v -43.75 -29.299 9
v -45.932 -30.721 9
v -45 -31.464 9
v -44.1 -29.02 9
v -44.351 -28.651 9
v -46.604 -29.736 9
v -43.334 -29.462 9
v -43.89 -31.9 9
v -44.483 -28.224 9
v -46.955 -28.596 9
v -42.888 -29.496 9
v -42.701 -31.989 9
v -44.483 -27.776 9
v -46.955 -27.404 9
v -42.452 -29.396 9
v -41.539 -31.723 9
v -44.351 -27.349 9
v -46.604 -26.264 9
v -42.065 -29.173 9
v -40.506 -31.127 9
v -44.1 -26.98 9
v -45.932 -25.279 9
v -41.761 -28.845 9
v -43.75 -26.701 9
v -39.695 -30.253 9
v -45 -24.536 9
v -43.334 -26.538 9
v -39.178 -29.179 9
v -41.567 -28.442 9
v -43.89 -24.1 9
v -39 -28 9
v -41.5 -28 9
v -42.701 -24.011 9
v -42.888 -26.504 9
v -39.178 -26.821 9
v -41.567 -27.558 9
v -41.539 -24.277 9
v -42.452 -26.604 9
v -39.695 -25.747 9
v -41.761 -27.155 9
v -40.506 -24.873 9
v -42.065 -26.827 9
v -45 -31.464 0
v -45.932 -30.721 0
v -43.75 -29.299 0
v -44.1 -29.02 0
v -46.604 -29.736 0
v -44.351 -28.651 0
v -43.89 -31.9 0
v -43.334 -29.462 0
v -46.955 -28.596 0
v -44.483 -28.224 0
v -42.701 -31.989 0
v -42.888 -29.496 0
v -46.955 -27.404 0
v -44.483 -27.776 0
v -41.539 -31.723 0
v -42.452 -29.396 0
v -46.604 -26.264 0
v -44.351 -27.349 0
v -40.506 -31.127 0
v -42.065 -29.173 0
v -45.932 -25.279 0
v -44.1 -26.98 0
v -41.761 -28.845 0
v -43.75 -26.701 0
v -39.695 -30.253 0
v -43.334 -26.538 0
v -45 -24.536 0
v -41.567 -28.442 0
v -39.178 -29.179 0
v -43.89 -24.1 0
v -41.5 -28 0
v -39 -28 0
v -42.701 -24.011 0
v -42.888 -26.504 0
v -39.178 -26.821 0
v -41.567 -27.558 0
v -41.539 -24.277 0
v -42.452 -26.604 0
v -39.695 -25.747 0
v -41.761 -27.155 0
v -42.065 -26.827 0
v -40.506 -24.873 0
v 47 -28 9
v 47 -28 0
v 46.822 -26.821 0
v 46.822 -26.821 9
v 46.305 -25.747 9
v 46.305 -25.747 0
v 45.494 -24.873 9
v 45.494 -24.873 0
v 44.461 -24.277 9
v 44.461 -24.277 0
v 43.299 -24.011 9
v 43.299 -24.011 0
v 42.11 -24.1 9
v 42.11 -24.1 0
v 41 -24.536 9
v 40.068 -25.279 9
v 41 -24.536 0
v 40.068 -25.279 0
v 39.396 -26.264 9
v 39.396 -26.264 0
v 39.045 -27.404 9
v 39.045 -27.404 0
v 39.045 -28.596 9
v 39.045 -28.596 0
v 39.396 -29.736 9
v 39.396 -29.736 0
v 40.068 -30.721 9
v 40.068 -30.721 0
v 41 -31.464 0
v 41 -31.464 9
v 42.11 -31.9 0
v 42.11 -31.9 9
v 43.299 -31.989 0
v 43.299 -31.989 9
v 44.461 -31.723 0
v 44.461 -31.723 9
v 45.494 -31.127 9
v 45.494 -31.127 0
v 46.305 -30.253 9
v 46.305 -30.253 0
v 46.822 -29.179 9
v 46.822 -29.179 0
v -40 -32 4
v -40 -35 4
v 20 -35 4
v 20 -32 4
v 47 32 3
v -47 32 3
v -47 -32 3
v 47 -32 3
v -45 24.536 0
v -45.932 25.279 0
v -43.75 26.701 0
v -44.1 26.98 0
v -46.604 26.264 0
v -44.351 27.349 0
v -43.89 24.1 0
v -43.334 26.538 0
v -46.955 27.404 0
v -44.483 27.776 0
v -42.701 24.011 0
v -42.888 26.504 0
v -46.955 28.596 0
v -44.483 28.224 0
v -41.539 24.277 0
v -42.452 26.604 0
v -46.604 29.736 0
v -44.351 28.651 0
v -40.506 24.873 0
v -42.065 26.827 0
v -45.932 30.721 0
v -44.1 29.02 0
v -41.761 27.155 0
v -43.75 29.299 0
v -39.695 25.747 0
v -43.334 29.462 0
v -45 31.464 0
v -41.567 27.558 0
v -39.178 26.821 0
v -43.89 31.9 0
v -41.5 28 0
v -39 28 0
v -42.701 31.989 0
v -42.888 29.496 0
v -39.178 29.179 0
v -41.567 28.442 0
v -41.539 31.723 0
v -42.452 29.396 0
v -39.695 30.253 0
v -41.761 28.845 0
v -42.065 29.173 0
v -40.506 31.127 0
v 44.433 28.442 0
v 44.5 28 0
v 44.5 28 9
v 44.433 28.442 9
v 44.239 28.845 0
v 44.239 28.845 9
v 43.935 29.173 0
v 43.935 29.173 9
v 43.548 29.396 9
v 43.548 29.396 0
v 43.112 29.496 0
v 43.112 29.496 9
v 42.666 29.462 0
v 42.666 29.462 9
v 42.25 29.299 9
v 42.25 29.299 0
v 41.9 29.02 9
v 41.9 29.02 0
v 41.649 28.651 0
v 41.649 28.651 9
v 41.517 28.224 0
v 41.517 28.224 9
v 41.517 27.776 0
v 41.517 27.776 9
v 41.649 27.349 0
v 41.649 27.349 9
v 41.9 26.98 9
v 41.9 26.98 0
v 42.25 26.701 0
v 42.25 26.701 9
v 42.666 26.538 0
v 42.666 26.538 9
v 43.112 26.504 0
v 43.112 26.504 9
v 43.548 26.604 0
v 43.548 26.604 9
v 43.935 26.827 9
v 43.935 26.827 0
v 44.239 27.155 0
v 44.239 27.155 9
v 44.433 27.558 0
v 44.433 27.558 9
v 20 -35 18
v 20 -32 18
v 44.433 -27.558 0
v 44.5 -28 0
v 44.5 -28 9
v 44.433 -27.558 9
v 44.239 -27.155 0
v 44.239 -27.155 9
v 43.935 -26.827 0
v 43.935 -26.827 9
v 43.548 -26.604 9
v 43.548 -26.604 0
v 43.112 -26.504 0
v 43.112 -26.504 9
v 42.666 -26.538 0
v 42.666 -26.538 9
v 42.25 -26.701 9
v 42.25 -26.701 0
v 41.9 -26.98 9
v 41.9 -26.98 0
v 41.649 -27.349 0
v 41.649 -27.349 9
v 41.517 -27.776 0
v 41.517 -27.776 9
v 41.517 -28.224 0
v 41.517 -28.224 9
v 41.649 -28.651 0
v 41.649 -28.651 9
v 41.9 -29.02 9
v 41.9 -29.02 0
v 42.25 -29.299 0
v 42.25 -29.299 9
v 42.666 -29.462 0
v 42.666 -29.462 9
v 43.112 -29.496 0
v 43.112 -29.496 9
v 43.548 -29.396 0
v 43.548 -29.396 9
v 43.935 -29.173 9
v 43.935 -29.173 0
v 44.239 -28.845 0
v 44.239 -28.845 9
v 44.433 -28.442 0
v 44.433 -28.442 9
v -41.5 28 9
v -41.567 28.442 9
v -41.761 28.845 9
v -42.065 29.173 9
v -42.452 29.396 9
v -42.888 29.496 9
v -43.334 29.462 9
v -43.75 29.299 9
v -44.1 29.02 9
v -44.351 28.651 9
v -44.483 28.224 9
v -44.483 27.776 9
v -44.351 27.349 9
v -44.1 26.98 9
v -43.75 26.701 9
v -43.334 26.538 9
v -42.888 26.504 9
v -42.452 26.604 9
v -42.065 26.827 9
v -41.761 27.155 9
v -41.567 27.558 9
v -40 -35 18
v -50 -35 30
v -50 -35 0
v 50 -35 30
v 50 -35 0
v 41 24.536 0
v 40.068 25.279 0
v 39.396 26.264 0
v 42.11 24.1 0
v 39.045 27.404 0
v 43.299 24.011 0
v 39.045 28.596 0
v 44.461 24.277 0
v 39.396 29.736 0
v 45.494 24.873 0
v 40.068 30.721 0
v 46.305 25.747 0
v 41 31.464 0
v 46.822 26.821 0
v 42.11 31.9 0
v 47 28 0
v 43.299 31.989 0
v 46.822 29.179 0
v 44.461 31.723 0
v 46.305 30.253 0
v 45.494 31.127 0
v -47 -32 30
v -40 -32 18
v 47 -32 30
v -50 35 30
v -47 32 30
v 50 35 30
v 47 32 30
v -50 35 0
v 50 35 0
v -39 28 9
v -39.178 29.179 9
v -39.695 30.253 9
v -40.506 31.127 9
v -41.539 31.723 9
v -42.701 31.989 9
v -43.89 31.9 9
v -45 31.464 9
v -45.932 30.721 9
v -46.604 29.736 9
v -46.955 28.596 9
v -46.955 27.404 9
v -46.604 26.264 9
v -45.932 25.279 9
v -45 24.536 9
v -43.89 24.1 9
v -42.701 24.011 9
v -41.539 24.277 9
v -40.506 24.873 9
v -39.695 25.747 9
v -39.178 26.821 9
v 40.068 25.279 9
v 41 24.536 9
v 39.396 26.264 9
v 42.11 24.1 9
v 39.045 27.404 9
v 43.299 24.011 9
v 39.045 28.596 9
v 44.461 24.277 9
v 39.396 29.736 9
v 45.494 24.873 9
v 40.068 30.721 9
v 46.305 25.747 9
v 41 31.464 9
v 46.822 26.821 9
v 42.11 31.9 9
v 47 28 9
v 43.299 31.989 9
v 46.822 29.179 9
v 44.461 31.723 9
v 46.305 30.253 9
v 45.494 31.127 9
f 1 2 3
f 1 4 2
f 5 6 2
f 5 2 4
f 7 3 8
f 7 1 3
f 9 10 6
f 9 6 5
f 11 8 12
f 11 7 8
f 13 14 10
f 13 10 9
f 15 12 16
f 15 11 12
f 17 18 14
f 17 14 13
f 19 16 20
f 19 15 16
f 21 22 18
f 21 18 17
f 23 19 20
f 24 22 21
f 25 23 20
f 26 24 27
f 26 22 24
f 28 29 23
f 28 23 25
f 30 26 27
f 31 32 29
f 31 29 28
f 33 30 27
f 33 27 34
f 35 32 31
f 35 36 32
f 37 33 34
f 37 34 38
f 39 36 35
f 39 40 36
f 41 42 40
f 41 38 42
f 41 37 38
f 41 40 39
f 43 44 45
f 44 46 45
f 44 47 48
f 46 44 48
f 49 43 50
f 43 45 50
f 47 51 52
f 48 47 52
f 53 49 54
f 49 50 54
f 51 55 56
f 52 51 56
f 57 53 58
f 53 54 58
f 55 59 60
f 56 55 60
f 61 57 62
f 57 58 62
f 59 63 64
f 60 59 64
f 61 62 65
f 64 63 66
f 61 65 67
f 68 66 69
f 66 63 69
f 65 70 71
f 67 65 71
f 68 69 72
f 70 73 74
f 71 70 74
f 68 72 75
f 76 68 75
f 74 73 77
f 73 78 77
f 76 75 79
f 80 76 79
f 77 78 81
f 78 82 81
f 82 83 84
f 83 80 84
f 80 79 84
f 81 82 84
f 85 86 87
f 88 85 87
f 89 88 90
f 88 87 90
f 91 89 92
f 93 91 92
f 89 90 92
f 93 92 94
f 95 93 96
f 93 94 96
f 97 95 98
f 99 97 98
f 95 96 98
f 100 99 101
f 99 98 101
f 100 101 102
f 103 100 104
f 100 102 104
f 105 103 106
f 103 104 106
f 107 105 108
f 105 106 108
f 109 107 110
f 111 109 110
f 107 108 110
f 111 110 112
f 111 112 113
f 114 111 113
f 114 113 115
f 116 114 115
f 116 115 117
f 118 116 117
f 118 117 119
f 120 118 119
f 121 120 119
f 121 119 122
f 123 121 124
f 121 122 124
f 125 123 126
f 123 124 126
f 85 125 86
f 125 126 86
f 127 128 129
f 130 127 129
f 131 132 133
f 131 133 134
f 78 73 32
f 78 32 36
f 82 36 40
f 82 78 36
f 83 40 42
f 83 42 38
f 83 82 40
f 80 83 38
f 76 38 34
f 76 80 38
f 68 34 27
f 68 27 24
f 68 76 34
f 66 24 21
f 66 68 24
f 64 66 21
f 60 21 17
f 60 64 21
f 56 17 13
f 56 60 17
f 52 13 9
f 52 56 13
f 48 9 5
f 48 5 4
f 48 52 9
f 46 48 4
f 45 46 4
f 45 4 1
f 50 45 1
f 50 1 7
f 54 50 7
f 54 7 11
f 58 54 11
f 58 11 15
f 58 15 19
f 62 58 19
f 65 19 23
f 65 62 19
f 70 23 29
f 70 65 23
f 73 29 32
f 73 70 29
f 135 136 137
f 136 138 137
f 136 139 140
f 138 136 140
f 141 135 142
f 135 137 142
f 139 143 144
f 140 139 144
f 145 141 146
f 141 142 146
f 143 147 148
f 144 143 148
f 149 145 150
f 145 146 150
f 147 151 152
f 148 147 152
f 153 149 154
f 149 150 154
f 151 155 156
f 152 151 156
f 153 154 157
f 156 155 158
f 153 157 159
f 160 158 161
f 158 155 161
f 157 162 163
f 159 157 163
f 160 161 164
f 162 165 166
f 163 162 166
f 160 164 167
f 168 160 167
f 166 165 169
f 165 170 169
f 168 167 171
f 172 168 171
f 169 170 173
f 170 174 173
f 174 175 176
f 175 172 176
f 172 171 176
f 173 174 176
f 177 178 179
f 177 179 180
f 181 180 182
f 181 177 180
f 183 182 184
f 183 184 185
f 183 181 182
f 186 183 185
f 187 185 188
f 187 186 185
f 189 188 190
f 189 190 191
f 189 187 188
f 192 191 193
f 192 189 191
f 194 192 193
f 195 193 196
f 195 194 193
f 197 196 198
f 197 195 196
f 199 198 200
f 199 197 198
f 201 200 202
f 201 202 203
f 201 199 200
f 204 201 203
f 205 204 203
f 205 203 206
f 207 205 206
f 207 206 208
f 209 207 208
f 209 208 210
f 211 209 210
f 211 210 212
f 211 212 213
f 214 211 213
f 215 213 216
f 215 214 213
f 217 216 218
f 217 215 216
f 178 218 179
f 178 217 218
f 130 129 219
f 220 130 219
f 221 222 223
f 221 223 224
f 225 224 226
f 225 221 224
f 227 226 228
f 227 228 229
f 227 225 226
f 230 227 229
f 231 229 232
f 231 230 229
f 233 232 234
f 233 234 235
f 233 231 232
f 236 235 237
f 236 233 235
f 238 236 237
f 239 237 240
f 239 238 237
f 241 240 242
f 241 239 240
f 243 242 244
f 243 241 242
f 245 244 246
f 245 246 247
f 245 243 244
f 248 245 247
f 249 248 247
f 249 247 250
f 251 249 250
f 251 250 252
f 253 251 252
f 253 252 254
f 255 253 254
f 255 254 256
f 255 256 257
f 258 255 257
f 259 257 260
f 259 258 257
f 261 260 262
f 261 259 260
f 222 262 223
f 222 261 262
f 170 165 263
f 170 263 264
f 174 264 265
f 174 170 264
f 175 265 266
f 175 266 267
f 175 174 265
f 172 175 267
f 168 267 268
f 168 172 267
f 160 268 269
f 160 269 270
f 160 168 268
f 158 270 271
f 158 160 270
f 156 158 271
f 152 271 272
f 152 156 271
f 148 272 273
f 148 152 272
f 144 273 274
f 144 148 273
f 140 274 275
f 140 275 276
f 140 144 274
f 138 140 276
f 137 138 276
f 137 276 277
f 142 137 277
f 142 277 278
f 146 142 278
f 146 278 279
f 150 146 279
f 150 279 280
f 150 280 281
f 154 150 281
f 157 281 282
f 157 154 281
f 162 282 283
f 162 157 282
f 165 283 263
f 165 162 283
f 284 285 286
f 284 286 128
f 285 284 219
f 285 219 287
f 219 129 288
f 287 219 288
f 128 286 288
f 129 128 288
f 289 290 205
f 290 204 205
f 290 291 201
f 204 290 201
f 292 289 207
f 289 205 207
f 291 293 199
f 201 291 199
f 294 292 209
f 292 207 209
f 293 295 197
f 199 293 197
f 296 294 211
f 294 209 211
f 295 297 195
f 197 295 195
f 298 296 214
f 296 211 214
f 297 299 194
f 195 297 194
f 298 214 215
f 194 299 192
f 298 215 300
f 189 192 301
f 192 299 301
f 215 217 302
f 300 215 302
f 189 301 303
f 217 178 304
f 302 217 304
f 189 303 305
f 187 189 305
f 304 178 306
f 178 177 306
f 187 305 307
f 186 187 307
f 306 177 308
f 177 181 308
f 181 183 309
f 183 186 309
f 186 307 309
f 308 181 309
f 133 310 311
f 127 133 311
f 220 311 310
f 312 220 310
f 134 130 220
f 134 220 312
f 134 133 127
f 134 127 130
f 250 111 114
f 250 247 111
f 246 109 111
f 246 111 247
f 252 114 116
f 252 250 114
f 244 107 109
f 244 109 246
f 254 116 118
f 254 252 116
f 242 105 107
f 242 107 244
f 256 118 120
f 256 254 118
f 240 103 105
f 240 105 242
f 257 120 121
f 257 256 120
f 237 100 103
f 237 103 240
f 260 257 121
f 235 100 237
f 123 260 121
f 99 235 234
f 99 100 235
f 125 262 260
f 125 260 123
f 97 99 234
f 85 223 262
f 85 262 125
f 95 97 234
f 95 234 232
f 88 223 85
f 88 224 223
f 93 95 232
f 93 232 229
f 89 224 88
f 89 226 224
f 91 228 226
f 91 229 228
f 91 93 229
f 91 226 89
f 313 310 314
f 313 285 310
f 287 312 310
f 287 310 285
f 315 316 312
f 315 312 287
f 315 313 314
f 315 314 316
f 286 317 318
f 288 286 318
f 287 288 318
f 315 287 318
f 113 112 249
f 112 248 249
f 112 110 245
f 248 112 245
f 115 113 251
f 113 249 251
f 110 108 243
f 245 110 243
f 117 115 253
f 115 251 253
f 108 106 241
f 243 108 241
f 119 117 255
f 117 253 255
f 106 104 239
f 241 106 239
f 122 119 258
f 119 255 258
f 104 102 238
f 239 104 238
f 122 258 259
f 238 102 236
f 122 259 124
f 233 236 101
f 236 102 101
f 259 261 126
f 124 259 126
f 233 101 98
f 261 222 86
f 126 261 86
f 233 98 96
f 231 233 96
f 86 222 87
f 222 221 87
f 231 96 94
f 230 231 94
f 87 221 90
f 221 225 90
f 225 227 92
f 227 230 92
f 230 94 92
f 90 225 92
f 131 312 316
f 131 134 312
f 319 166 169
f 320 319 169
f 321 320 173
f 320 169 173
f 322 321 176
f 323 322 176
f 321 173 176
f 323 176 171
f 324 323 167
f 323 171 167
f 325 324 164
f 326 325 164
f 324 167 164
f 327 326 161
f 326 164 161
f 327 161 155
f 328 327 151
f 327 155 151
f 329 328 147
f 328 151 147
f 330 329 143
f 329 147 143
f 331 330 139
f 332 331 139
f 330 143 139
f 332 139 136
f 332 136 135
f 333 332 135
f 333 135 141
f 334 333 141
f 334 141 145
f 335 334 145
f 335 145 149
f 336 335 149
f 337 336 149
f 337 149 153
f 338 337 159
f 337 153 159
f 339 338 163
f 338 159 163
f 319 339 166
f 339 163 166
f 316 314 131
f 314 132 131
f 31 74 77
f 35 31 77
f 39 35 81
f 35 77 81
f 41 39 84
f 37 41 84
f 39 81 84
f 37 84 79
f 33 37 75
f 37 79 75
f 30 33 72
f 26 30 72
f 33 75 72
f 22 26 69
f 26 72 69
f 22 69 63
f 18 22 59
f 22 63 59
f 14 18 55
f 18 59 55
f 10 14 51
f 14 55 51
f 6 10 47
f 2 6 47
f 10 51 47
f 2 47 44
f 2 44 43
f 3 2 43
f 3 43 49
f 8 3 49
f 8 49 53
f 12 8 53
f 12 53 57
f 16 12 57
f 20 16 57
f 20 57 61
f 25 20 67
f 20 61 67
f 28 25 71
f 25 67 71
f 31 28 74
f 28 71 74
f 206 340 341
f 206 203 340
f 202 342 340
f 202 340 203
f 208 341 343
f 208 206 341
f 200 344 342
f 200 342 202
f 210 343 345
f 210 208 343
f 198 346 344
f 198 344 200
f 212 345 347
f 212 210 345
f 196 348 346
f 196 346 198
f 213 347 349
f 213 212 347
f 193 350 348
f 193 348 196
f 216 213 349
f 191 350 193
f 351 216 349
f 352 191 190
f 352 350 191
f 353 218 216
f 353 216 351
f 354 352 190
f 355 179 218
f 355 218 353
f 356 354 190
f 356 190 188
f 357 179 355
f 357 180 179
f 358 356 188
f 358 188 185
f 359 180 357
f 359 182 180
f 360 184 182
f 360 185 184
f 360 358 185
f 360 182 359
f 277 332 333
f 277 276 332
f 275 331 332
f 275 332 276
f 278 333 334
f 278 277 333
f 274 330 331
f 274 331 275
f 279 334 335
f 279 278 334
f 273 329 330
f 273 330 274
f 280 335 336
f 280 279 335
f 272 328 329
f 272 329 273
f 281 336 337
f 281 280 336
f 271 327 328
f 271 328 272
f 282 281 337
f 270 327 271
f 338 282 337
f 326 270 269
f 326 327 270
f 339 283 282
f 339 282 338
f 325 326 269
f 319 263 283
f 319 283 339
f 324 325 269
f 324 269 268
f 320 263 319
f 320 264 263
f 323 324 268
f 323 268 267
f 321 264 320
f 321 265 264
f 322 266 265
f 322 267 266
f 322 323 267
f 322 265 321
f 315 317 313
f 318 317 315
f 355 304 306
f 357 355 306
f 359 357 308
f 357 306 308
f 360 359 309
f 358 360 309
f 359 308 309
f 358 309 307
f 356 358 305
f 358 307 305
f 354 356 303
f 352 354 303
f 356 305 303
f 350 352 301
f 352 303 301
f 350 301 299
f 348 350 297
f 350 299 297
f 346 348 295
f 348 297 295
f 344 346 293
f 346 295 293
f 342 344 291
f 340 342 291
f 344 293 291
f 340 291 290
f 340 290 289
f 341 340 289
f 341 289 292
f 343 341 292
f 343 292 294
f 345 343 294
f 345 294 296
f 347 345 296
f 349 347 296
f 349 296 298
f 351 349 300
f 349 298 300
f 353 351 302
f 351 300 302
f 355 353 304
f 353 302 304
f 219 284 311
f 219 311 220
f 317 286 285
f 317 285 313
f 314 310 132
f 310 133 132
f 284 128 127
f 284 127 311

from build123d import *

# Parameters (mm, degrees)
F0_W     = 100
F0_H     = 70
F1_DEPTH = 30
F2_T     = -3
F3_R     = 4
F3_R_2   = 1.5
F4_DEPTH = 9
F5_W     = 60
F5_H     = 14
F6_DEPTH = 3


with BuildPart() as f1:
    # F0 (on Top) → F1 (new body)
    with BuildSketch(Plane.XY):
        Rectangle(F0_W, F0_H)
    extrude(amount=F1_DEPTH)

    # F2
    f2_openings = [f1.faces().sort_by_distance(p)[0] for p in [
        (0, 0, 30),
    ]]
    offset(amount=F2_T, openings=f2_openings)

    # F5 (on face) → F6 (cut)
    with BuildSketch(Plane.XZ.offset(35)):
        with Locations((-10, 11)):
            Rectangle(F5_W, F5_H)
    extrude(amount=-F6_DEPTH, mode=Mode.SUBTRACT)


with BuildPart() as f4:
    # F3 (on Top) → F4 (new body)
    with BuildSketch(Plane.XY):
        with Locations((-43, 28)):
            Circle(F3_R)
        with Locations((-43, 28)):
            Circle(F3_R_2, mode=Mode.SUBTRACT)
        with Locations((43, 28)):
            Circle(F3_R)
        with Locations((43, 28)):
            Circle(F3_R_2, mode=Mode.SUBTRACT)
        with Locations((43, -28)):
            Circle(F3_R)
        with Locations((43, -28)):
            Circle(F3_R_2, mode=Mode.SUBTRACT)
        with Locations((-43, -28)):
            Circle(F3_R)
        with Locations((-43, -28)):
            Circle(F3_R_2, mode=Mode.SUBTRACT)
    extrude(amount=F4_DEPTH)


solid = Compound([f1.part, f4.part])
